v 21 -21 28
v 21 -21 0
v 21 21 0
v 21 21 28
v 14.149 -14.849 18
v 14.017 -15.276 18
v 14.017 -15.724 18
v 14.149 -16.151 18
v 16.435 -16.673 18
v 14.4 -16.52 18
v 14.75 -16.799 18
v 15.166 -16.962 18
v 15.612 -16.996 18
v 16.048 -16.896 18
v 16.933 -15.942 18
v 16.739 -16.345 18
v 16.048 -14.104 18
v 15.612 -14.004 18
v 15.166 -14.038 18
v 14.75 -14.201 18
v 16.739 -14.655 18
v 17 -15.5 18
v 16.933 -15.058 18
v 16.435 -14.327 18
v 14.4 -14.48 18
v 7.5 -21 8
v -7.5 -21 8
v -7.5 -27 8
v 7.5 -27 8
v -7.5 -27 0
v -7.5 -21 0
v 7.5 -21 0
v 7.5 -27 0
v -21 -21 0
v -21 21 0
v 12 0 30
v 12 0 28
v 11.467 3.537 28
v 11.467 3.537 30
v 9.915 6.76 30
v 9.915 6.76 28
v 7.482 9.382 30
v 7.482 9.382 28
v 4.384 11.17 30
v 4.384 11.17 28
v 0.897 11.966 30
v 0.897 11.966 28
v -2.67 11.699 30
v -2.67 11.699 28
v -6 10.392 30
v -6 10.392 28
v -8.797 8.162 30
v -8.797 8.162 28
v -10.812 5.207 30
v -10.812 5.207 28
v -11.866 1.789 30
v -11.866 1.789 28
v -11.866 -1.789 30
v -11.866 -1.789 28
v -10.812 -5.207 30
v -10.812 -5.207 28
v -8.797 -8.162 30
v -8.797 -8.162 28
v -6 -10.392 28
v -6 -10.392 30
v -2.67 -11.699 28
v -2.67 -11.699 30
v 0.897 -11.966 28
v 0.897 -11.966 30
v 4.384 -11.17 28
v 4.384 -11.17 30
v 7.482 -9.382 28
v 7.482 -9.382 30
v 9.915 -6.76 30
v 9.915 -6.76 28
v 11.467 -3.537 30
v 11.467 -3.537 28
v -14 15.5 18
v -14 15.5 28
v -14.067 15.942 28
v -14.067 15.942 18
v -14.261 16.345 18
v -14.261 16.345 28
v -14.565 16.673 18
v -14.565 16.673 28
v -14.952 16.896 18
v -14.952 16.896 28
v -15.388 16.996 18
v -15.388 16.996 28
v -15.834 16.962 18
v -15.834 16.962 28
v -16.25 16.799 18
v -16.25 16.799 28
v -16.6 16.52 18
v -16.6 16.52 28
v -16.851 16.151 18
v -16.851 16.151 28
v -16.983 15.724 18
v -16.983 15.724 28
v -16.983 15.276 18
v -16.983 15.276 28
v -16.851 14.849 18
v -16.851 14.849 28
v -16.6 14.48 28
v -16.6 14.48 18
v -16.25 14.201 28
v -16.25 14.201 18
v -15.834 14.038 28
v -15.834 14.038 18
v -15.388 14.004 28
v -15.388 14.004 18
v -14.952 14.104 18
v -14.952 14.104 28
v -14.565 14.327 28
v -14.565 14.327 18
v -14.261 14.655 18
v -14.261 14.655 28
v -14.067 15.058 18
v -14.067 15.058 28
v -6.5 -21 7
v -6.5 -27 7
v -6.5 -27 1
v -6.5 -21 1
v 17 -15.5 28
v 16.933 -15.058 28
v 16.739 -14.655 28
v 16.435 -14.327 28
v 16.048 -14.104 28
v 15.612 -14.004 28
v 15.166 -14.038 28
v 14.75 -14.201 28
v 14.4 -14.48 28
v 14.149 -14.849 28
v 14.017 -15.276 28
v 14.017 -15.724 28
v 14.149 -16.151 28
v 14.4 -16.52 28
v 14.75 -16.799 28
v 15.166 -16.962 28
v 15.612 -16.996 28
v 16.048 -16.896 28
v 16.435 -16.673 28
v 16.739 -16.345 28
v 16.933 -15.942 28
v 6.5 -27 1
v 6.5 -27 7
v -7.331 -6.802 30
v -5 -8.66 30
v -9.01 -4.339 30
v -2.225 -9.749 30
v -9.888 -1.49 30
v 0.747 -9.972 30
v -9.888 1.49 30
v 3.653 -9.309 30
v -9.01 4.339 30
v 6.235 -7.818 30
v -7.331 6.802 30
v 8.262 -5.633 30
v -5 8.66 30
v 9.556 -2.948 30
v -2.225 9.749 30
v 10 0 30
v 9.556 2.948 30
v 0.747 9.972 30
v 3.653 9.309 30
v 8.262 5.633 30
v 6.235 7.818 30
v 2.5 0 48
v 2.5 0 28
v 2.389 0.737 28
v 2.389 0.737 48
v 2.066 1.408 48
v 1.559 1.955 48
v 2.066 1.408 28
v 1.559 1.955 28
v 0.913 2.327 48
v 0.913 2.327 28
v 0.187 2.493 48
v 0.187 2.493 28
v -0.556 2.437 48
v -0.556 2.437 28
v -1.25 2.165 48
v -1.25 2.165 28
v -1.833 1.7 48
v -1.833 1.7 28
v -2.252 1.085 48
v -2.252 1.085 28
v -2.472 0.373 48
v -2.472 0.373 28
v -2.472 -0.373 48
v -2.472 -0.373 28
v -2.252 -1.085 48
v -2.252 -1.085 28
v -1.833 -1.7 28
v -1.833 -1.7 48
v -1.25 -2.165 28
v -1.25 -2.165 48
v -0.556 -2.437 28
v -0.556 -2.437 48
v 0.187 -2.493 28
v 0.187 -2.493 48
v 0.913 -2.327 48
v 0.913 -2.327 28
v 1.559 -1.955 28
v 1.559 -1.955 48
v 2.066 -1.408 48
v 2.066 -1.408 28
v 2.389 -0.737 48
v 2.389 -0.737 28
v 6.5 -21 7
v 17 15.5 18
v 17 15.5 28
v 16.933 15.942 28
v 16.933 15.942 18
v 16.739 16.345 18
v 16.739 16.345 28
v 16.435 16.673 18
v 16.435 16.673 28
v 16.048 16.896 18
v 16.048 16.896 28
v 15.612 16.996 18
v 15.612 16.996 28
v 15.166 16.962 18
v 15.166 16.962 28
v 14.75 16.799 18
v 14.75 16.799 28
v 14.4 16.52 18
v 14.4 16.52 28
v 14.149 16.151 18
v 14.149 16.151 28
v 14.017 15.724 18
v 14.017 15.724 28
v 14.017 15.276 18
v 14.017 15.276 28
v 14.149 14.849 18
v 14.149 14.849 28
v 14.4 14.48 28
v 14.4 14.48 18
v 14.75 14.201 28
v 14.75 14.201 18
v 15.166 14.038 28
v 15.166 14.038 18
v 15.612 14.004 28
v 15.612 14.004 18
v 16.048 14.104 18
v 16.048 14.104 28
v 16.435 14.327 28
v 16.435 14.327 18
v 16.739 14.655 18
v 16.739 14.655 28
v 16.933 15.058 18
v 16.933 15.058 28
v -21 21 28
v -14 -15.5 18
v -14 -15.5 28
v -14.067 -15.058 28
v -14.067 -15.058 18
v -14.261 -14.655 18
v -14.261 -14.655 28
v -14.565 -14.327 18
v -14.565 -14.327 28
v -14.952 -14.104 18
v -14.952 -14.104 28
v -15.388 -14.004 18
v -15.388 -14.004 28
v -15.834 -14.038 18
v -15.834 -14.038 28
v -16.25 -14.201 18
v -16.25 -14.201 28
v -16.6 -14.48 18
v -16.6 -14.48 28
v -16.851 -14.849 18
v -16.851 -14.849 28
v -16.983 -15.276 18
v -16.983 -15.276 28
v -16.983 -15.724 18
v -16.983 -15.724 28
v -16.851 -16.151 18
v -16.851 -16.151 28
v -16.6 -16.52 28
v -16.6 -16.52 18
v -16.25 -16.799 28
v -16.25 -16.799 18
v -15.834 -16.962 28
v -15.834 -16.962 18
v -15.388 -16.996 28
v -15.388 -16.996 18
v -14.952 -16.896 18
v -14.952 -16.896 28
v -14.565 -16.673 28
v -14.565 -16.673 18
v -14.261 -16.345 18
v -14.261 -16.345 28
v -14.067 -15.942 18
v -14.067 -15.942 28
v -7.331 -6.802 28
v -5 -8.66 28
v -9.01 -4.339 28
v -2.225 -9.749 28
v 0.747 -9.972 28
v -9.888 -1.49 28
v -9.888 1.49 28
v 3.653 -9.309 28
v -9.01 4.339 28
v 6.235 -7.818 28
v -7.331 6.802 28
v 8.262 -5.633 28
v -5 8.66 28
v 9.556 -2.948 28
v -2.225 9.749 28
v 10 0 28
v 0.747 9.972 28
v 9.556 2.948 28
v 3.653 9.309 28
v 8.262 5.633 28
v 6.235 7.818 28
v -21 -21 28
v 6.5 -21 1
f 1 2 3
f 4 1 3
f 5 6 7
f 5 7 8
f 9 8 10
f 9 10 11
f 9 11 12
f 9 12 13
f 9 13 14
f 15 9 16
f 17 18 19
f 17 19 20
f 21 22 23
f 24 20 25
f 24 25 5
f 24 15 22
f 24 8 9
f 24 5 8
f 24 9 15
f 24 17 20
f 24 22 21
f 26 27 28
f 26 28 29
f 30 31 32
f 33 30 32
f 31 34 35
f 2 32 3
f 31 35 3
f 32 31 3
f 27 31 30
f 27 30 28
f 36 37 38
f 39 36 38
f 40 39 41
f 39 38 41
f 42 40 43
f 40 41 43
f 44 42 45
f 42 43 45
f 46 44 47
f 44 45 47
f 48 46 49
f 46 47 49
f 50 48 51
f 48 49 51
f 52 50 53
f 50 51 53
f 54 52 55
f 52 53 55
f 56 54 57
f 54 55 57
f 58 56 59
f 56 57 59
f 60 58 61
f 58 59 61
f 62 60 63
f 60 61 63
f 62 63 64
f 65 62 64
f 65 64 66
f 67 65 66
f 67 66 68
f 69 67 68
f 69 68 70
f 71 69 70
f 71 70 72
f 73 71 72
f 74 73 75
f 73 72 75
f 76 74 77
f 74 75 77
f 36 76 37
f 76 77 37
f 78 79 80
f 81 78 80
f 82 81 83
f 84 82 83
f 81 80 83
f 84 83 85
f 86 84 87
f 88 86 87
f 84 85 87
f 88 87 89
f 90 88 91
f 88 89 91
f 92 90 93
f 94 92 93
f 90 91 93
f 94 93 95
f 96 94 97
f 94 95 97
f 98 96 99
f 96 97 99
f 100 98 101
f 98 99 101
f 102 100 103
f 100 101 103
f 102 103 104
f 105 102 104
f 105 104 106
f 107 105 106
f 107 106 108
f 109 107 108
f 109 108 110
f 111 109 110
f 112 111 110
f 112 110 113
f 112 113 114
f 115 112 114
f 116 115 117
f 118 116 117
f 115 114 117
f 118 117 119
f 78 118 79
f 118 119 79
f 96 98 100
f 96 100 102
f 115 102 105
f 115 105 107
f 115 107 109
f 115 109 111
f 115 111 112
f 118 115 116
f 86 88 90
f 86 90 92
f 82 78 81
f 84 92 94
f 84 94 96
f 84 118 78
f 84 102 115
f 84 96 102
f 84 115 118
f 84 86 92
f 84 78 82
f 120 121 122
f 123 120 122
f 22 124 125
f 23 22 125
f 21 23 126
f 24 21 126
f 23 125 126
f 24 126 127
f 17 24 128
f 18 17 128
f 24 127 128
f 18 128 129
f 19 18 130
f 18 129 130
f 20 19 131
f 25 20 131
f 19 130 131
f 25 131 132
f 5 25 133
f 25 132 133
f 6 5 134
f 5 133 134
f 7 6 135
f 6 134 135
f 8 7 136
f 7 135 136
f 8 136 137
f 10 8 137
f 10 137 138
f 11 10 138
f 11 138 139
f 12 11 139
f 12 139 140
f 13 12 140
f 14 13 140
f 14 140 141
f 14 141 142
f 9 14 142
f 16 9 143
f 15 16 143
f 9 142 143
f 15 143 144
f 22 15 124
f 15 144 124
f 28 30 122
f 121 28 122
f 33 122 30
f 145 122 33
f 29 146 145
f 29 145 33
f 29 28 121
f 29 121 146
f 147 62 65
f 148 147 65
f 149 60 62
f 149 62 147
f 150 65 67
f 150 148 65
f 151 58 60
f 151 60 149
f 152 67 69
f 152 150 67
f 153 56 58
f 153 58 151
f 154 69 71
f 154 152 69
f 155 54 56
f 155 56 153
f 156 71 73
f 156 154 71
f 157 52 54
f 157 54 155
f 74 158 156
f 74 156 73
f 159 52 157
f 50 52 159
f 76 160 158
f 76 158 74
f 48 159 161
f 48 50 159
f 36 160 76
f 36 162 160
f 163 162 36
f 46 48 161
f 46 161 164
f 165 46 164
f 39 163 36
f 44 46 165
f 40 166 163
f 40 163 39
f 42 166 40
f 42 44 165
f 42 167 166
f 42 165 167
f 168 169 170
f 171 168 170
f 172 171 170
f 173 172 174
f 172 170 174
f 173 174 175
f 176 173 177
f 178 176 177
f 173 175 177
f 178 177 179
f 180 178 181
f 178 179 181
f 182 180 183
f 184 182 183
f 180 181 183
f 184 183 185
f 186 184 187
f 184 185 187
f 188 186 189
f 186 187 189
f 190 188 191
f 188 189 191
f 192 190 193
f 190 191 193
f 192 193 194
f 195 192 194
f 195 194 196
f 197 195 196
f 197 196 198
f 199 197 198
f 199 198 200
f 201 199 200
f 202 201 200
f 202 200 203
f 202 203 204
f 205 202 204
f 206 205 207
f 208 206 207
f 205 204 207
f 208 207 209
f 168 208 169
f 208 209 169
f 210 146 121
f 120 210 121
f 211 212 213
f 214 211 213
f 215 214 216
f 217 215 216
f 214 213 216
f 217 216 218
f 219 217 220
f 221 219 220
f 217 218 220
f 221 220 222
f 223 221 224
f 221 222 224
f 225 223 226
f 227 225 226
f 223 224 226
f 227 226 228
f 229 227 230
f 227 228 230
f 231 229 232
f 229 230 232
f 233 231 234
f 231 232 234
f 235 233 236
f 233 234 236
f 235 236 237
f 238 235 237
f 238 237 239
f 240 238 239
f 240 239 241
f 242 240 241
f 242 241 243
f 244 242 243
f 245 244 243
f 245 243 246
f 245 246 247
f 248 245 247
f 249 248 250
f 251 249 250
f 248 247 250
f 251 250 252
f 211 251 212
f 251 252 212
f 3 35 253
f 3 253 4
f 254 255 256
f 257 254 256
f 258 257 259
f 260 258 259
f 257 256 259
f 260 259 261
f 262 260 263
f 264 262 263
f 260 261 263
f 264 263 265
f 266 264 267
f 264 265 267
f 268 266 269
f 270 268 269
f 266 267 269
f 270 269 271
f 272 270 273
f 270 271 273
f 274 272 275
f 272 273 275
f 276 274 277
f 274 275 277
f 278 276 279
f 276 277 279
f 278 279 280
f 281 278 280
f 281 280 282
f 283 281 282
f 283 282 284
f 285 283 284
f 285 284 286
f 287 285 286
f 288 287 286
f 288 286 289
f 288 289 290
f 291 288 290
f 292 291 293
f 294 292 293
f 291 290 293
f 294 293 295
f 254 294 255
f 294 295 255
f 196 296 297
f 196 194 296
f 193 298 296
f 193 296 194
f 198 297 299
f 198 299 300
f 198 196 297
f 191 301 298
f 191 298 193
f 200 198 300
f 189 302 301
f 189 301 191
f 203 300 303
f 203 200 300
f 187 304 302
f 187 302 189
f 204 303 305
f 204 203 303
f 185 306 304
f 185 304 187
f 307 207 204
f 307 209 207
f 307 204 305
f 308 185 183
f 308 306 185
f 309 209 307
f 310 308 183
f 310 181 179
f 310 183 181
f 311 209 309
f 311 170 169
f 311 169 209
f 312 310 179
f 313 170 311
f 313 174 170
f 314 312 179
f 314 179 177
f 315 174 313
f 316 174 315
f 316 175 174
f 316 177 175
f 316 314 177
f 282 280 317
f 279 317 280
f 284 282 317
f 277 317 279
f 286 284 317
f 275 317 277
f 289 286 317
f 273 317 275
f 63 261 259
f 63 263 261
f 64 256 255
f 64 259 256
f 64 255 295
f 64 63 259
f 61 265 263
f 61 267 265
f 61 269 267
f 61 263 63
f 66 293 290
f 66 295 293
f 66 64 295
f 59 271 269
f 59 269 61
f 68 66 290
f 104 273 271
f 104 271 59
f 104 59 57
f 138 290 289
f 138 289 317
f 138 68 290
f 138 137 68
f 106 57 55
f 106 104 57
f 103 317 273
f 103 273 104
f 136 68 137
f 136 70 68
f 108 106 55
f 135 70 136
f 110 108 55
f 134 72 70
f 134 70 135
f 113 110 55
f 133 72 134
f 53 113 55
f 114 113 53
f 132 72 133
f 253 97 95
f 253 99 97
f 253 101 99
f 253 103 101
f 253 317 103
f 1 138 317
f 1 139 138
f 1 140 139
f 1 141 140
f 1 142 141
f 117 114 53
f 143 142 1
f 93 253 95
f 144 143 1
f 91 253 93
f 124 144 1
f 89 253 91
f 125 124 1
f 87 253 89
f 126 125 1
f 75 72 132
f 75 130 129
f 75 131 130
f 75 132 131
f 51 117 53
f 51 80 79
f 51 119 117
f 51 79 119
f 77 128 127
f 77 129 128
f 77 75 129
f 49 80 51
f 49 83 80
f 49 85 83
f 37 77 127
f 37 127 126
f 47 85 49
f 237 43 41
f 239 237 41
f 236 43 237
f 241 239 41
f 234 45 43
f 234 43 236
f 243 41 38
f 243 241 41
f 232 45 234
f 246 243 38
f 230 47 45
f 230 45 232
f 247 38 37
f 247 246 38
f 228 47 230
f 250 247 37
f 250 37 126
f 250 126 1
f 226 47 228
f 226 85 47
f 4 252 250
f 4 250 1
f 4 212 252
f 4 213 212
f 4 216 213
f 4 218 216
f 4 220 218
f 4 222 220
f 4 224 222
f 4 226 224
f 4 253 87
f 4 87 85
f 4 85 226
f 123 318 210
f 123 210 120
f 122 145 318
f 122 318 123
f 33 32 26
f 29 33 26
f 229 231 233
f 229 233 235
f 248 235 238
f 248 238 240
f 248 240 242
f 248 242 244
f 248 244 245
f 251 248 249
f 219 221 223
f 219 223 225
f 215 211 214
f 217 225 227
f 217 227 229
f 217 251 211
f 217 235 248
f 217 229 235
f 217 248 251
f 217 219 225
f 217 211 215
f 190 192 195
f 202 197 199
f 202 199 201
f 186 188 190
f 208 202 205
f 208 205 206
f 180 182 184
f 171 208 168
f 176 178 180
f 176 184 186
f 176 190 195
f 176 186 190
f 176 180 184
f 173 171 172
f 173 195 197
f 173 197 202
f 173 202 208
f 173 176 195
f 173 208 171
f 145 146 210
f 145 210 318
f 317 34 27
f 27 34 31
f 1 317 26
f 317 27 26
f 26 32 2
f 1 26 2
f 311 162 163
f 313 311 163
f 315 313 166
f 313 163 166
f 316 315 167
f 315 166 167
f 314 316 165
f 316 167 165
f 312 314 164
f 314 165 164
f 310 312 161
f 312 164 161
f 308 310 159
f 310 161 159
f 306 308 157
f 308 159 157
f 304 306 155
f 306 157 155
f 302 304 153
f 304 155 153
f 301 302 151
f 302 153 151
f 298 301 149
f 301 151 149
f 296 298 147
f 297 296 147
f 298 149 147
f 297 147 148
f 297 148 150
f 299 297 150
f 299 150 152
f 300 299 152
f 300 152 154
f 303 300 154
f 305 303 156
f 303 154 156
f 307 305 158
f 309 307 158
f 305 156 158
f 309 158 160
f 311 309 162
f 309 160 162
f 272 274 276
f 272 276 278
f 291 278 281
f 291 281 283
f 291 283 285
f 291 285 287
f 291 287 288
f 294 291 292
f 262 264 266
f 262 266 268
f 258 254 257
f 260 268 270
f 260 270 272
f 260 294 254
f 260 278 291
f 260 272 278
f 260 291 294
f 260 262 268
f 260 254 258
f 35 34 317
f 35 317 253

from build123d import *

# Parameters (mm, degrees)
SKETCH2_W           = 42
SKETCH2_H           = 42
BOSS_EXTRUDE1_DEPTH = 28
SKETCH3_R           = 1.5
CUT_EXTRUDE1_DEPTH  = 10
SKETCH4_R           = 12
BOSS_EXTRUDE2_DEPTH = 2
SKETCH5_R           = 10
CUT_EXTRUDE2_DEPTH  = 2
SKETCH6_R           = 2.5
BOSS_EXTRUDE3_DEPTH = 20
SKETCH7_W           = 15
SKETCH7_H           = 8
BOSS_EXTRUDE4_DEPTH = 6
SKETCH8_W           = 13
SKETCH8_H           = 6
CUT_EXTRUDE4_DEPTH  = 6


with BuildPart() as part:
    # Sketch2 → Boss-Extrude1 (new body)
    with BuildSketch(Plane.XY):
        Rectangle(SKETCH2_W, SKETCH2_H)
    extrude(amount=BOSS_EXTRUDE1_DEPTH)

    # Sketch3 → Cut-Extrude1 (cut)
    with BuildSketch(Plane.XY.offset(28)):
        with Locations((15.5, 15.5)):
            Circle(SKETCH3_R)
        with Locations((-15.5, 15.5)):
            Circle(SKETCH3_R)
        with Locations((-15.5, -15.5)):
            Circle(SKETCH3_R)
        with Locations((15.5, -15.5)):
            Circle(SKETCH3_R)
    extrude(amount=-CUT_EXTRUDE1_DEPTH, mode=Mode.SUBTRACT)

    # Sketch4 → Boss-Extrude2 (add)
    with BuildSketch(Plane.XY.offset(28)):
        Circle(SKETCH4_R)
    extrude(amount=BOSS_EXTRUDE2_DEPTH)

    # Sketch5 → Cut-Extrude2 (cut)
    with BuildSketch(Plane.XY.offset(30)):
        Circle(SKETCH5_R)
    extrude(amount=-CUT_EXTRUDE2_DEPTH, mode=Mode.SUBTRACT)

    # Sketch6 → Boss-Extrude3 (add)
    with BuildSketch(Plane.XY.offset(28)):
        Circle(SKETCH6_R)
    extrude(amount=BOSS_EXTRUDE3_DEPTH)

    # Sketch7 → Boss-Extrude4 (add)
    with BuildSketch(Plane.XZ.offset(21)):
        with Locations((0, 4)):
            Rectangle(SKETCH7_W, SKETCH7_H)
    extrude(amount=BOSS_EXTRUDE4_DEPTH)

    # Sketch8 → Cut-Extrude4 (cut)
    with BuildSketch(Plane(origin=(0, -27, 0), x_dir=(-1, 0, 0), z_dir=(0, -1, 0))):
        with Locations((0, -4)):
            Rectangle(SKETCH8_W, SKETCH8_H)
    extrude(amount=-CUT_EXTRUDE4_DEPTH, mode=Mode.SUBTRACT)


solid = part.part
